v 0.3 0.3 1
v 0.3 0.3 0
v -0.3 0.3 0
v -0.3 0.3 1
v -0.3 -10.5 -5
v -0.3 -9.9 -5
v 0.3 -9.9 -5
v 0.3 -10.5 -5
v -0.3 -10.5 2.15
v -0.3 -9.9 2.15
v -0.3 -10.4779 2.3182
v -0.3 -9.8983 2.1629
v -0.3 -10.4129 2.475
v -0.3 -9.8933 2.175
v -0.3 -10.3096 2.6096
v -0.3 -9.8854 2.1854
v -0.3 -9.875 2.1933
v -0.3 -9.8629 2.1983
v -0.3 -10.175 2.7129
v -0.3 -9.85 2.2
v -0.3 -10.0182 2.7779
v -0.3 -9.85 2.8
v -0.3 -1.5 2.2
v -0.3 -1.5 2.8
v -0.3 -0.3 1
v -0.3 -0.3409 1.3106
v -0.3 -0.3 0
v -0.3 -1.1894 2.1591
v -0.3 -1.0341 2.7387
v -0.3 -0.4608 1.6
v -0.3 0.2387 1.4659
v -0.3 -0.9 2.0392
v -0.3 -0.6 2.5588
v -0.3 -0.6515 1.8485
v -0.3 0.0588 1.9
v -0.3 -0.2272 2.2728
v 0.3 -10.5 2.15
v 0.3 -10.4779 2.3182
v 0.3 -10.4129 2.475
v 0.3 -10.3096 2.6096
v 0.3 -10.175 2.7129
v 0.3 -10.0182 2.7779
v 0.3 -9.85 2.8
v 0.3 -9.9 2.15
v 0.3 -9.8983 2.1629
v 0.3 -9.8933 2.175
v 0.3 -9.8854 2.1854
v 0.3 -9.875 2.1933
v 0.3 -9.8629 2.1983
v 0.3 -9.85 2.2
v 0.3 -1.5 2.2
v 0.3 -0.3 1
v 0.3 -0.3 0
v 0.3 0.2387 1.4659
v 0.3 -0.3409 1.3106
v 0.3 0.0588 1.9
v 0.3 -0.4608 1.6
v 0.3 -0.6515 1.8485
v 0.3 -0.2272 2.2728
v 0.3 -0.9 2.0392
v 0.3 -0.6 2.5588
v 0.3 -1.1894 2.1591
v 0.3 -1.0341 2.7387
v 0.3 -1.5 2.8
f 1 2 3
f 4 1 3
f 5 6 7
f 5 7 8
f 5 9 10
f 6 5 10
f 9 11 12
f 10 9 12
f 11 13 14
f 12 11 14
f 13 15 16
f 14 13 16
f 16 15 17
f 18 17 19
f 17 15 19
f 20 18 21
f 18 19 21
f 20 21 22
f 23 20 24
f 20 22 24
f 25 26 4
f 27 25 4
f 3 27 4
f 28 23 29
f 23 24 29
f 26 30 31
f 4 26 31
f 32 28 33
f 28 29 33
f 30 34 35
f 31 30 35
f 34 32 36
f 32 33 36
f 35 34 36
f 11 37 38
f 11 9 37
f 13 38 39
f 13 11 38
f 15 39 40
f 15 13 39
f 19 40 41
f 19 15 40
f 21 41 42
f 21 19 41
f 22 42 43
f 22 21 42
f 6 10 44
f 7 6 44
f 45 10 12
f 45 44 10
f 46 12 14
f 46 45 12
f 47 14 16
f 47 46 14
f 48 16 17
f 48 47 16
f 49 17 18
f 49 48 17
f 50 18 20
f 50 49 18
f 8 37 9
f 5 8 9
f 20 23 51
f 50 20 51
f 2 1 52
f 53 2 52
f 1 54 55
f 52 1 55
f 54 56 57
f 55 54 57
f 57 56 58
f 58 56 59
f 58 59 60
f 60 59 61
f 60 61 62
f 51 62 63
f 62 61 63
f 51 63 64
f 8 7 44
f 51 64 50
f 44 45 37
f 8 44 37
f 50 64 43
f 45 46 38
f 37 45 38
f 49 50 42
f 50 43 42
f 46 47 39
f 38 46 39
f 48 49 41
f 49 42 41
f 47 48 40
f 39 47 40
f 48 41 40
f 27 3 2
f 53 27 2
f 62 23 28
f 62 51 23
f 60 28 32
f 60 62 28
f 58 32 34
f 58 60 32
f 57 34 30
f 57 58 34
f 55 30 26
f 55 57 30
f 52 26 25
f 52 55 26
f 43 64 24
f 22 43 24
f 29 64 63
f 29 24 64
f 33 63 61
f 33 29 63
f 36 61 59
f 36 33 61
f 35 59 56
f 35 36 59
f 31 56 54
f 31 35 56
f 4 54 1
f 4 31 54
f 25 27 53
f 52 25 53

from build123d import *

# Parameters (mm, degrees)
SKETCH2_W = 0.6
SKETCH2_H = 0.6


with BuildPart() as part:
    # Sweep1: sweep along a path in Sketch1
    with BuildLine(Plane(origin=(0, 0, 0), x_dir=(0, 0, -1), z_dir=(1, 0, 0))) as sweep1_path:
        Line((5, -10.2), (-2.15, -10.2))
        ThreePointArc((-2.15, -10.2), (-2.397487373, -10.097487373), (-2.5, -9.85))
        Line((-2.5, -9.85), (-2.5, -1.5))
        ThreePointArc((-2.5, -1.5), (-2.060660172, -0.439339828), (-1, 0))
        Line((-1, 0), (0, 0))
    # Sketch2 → Sweep1 (sweep)
    with BuildSketch(Plane.XY):
        Rectangle(SKETCH2_W, SKETCH2_H)
    sweep(path=sweep1_path.line)


solid = part.part
